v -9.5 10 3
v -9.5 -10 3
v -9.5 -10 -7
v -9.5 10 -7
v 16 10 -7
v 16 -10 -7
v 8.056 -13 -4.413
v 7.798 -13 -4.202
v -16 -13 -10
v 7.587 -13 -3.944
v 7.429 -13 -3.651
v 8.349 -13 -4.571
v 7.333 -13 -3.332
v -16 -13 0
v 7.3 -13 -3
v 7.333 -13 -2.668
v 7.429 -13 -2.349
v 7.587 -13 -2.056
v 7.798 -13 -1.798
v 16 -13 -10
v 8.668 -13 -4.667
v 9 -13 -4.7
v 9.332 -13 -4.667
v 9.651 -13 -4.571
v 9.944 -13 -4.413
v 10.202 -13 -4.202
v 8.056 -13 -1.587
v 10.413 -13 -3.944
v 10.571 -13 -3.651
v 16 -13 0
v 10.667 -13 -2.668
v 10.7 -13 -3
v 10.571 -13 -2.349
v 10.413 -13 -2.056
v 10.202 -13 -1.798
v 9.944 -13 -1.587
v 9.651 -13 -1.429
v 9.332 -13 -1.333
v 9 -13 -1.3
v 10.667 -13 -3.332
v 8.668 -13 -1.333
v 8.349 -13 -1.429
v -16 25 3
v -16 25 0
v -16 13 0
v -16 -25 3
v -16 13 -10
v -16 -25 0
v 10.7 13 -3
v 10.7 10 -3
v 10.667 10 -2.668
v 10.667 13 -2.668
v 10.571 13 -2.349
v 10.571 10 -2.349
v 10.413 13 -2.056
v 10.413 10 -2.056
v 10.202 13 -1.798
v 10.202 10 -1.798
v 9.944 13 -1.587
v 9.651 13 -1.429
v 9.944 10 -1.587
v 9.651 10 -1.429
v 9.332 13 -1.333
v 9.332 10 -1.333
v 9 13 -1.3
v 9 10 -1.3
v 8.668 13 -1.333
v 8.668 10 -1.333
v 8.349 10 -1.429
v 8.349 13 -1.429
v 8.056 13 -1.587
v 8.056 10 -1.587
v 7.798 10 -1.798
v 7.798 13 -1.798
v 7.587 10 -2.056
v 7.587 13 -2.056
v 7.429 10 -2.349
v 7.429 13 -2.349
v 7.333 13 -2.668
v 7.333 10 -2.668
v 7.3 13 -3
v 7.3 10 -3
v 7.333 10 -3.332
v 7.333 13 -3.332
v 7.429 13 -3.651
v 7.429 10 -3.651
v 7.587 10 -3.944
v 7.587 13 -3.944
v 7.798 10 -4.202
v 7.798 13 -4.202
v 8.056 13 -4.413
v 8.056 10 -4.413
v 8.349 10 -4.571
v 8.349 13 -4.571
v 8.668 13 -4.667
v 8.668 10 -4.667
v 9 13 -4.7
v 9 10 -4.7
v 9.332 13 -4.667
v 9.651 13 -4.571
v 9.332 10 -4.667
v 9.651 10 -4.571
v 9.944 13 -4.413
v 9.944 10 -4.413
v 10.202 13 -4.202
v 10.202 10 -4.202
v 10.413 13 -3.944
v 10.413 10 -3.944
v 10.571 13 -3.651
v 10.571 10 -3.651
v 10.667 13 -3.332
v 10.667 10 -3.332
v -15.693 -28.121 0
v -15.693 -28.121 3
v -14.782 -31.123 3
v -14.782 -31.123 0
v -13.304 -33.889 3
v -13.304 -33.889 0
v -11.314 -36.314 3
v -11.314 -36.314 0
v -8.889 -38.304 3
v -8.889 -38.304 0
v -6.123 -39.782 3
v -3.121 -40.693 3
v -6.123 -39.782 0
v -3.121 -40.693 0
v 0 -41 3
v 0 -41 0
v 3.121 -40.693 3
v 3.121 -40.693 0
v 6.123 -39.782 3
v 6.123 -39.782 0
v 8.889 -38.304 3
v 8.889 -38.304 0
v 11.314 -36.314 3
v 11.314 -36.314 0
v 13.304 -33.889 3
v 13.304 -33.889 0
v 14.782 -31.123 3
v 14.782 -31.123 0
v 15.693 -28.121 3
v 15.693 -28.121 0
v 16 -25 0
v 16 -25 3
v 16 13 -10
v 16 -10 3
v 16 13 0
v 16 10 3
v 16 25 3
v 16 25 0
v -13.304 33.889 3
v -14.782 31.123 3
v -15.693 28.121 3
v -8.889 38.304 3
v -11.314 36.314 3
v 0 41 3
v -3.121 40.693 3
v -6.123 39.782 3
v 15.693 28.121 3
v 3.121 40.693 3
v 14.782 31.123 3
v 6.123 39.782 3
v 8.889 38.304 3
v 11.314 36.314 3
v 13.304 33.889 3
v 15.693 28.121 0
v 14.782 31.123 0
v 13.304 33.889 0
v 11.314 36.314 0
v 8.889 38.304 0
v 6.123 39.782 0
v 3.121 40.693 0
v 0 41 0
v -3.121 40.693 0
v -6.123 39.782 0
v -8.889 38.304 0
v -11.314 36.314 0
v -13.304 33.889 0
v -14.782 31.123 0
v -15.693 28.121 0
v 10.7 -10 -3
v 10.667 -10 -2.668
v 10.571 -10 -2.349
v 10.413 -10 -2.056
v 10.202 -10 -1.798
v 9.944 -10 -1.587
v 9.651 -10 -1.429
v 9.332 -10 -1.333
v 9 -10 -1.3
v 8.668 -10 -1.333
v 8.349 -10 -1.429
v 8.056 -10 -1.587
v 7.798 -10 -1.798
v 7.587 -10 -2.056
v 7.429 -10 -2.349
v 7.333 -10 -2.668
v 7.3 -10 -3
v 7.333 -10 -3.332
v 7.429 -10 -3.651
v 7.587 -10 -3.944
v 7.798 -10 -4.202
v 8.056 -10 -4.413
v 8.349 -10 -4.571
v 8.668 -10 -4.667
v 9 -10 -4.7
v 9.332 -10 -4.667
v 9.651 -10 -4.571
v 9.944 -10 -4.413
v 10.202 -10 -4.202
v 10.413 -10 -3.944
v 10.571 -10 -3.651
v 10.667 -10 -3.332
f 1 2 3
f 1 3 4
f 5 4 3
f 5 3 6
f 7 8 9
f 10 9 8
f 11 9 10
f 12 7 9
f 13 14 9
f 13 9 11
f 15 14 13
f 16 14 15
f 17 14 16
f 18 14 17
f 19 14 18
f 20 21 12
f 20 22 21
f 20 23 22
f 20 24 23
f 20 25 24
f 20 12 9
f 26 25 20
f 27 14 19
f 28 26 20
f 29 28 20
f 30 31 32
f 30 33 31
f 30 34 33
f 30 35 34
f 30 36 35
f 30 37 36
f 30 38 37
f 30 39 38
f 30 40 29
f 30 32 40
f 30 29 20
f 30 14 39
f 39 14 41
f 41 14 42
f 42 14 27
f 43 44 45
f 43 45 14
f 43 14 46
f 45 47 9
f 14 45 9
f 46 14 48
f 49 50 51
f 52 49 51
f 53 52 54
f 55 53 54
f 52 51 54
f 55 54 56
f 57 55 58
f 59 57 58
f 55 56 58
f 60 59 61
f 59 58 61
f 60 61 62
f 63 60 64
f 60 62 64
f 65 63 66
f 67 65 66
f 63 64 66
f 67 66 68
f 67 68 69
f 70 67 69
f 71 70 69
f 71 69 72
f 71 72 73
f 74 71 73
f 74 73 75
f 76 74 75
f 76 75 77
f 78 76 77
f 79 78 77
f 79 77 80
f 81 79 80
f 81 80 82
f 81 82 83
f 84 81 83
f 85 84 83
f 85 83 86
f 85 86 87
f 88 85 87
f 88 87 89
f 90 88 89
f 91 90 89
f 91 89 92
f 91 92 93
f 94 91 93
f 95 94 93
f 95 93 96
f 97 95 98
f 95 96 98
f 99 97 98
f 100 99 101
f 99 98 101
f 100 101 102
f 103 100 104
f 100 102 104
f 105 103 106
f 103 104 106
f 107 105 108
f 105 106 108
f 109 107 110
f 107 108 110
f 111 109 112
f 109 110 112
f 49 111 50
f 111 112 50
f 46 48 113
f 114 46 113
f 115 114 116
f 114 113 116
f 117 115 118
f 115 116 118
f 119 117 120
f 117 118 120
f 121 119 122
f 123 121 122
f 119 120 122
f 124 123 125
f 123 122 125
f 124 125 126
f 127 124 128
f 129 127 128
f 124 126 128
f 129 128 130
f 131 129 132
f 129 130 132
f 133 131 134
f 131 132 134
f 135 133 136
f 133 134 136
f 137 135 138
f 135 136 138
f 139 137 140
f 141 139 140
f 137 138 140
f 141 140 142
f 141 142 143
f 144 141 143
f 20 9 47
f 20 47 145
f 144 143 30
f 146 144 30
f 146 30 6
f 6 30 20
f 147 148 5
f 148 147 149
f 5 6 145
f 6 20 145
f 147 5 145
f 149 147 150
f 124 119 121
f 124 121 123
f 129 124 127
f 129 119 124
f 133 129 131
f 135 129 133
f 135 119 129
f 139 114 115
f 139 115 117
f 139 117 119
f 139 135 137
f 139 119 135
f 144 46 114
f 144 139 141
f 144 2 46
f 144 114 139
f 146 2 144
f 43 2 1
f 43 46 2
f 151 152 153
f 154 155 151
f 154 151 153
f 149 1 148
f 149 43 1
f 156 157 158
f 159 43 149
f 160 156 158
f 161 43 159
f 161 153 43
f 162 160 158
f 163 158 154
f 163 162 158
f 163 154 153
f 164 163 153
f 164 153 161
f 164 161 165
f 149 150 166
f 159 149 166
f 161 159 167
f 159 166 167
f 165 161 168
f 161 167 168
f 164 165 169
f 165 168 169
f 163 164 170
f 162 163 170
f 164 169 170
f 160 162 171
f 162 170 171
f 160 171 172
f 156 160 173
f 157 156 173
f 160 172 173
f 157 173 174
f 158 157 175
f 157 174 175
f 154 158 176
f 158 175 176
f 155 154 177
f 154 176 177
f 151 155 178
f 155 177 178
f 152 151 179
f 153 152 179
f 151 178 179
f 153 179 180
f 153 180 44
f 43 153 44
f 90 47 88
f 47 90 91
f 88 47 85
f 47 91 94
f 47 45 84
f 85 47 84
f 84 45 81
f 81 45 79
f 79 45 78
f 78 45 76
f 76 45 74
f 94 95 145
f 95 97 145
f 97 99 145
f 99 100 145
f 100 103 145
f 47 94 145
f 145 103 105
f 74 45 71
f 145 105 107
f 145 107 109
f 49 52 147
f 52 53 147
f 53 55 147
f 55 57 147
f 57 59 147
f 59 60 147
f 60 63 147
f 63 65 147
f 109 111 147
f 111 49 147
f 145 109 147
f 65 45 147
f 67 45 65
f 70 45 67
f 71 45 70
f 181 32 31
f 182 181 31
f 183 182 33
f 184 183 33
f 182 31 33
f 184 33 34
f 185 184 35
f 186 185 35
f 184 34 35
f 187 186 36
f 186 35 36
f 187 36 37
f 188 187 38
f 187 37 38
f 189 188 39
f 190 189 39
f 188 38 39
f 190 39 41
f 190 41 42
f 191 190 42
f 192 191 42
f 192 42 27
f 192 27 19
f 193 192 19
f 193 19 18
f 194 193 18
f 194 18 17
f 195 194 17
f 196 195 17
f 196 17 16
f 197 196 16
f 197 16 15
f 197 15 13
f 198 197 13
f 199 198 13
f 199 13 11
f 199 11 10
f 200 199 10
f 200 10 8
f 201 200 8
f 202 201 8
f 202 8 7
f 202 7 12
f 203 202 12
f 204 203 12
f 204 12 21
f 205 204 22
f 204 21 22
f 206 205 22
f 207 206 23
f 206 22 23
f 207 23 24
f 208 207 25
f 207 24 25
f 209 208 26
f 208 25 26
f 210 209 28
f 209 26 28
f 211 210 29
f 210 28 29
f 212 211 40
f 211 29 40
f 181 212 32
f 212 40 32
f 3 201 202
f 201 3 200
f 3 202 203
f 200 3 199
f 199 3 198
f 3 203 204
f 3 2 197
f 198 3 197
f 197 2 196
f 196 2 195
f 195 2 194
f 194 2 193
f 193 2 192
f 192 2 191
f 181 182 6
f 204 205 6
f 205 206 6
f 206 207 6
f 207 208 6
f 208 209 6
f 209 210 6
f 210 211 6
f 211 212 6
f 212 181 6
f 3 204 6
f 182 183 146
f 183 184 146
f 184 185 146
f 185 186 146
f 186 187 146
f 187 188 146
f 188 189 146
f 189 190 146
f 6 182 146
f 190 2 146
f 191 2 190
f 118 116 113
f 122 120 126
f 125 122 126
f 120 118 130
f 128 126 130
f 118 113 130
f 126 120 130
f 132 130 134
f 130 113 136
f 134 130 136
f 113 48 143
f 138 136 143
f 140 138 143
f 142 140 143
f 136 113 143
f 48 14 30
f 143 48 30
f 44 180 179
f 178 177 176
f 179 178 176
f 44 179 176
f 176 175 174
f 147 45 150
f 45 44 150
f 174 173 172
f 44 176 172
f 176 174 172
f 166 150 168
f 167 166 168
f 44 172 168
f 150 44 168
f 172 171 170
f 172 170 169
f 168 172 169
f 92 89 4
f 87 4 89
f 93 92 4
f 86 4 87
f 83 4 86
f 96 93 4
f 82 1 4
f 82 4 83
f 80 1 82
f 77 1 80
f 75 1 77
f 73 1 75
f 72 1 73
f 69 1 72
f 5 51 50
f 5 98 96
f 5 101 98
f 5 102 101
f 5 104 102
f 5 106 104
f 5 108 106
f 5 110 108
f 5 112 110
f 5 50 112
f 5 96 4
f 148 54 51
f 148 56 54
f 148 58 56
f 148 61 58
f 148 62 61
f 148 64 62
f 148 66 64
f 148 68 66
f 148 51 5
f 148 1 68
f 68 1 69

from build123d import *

# Parameters (mm, degrees)
F1_DEPTH = 3
F2_W     = 32
F2_H     = 26
F3_DEPTH = 10
F4_W     = 25.5
F4_H     = 20
F5_DEPTH = 10
F6_R     = 1.7
F7_DEPTH = 101.6


with BuildPart() as f1:
    # F0 (on Top) → F1 (new body)
    with BuildSketch(Plane.XY):
        with BuildLine():
            Line((16, -25), (16, 25))
            ThreePointArc((16, 25), (0, 41), (-16, 25))
            Line((-16, 25), (-16, -25))
            ThreePointArc((-16, -25), (0, -41), (16, -25))
        make_face()
    extrude(amount=F1_DEPTH)

    # F2 (on face) → F3 (join)
    with BuildSketch(Plane(origin=(0, 0, 0), x_dir=(1, 0, 0), z_dir=(0, 0, -1))):
        Rectangle(F2_W, F2_H)
    extrude(amount=F3_DEPTH)

    # F4 (on face) → F5 (cut)
    with BuildSketch(Plane.XY.offset(3)):
        with Locations((3.25, 0)):
            Rectangle(F4_W, F4_H)
    extrude(amount=-F5_DEPTH, mode=Mode.SUBTRACT)

    # F6 (on face) → F7 (cut)
    with BuildSketch(Plane.XZ.offset(13)):
        with Locations((9, -3)):
            Circle(F6_R)
    extrude(amount=-F7_DEPTH, mode=Mode.SUBTRACT)


solid = f1.part
